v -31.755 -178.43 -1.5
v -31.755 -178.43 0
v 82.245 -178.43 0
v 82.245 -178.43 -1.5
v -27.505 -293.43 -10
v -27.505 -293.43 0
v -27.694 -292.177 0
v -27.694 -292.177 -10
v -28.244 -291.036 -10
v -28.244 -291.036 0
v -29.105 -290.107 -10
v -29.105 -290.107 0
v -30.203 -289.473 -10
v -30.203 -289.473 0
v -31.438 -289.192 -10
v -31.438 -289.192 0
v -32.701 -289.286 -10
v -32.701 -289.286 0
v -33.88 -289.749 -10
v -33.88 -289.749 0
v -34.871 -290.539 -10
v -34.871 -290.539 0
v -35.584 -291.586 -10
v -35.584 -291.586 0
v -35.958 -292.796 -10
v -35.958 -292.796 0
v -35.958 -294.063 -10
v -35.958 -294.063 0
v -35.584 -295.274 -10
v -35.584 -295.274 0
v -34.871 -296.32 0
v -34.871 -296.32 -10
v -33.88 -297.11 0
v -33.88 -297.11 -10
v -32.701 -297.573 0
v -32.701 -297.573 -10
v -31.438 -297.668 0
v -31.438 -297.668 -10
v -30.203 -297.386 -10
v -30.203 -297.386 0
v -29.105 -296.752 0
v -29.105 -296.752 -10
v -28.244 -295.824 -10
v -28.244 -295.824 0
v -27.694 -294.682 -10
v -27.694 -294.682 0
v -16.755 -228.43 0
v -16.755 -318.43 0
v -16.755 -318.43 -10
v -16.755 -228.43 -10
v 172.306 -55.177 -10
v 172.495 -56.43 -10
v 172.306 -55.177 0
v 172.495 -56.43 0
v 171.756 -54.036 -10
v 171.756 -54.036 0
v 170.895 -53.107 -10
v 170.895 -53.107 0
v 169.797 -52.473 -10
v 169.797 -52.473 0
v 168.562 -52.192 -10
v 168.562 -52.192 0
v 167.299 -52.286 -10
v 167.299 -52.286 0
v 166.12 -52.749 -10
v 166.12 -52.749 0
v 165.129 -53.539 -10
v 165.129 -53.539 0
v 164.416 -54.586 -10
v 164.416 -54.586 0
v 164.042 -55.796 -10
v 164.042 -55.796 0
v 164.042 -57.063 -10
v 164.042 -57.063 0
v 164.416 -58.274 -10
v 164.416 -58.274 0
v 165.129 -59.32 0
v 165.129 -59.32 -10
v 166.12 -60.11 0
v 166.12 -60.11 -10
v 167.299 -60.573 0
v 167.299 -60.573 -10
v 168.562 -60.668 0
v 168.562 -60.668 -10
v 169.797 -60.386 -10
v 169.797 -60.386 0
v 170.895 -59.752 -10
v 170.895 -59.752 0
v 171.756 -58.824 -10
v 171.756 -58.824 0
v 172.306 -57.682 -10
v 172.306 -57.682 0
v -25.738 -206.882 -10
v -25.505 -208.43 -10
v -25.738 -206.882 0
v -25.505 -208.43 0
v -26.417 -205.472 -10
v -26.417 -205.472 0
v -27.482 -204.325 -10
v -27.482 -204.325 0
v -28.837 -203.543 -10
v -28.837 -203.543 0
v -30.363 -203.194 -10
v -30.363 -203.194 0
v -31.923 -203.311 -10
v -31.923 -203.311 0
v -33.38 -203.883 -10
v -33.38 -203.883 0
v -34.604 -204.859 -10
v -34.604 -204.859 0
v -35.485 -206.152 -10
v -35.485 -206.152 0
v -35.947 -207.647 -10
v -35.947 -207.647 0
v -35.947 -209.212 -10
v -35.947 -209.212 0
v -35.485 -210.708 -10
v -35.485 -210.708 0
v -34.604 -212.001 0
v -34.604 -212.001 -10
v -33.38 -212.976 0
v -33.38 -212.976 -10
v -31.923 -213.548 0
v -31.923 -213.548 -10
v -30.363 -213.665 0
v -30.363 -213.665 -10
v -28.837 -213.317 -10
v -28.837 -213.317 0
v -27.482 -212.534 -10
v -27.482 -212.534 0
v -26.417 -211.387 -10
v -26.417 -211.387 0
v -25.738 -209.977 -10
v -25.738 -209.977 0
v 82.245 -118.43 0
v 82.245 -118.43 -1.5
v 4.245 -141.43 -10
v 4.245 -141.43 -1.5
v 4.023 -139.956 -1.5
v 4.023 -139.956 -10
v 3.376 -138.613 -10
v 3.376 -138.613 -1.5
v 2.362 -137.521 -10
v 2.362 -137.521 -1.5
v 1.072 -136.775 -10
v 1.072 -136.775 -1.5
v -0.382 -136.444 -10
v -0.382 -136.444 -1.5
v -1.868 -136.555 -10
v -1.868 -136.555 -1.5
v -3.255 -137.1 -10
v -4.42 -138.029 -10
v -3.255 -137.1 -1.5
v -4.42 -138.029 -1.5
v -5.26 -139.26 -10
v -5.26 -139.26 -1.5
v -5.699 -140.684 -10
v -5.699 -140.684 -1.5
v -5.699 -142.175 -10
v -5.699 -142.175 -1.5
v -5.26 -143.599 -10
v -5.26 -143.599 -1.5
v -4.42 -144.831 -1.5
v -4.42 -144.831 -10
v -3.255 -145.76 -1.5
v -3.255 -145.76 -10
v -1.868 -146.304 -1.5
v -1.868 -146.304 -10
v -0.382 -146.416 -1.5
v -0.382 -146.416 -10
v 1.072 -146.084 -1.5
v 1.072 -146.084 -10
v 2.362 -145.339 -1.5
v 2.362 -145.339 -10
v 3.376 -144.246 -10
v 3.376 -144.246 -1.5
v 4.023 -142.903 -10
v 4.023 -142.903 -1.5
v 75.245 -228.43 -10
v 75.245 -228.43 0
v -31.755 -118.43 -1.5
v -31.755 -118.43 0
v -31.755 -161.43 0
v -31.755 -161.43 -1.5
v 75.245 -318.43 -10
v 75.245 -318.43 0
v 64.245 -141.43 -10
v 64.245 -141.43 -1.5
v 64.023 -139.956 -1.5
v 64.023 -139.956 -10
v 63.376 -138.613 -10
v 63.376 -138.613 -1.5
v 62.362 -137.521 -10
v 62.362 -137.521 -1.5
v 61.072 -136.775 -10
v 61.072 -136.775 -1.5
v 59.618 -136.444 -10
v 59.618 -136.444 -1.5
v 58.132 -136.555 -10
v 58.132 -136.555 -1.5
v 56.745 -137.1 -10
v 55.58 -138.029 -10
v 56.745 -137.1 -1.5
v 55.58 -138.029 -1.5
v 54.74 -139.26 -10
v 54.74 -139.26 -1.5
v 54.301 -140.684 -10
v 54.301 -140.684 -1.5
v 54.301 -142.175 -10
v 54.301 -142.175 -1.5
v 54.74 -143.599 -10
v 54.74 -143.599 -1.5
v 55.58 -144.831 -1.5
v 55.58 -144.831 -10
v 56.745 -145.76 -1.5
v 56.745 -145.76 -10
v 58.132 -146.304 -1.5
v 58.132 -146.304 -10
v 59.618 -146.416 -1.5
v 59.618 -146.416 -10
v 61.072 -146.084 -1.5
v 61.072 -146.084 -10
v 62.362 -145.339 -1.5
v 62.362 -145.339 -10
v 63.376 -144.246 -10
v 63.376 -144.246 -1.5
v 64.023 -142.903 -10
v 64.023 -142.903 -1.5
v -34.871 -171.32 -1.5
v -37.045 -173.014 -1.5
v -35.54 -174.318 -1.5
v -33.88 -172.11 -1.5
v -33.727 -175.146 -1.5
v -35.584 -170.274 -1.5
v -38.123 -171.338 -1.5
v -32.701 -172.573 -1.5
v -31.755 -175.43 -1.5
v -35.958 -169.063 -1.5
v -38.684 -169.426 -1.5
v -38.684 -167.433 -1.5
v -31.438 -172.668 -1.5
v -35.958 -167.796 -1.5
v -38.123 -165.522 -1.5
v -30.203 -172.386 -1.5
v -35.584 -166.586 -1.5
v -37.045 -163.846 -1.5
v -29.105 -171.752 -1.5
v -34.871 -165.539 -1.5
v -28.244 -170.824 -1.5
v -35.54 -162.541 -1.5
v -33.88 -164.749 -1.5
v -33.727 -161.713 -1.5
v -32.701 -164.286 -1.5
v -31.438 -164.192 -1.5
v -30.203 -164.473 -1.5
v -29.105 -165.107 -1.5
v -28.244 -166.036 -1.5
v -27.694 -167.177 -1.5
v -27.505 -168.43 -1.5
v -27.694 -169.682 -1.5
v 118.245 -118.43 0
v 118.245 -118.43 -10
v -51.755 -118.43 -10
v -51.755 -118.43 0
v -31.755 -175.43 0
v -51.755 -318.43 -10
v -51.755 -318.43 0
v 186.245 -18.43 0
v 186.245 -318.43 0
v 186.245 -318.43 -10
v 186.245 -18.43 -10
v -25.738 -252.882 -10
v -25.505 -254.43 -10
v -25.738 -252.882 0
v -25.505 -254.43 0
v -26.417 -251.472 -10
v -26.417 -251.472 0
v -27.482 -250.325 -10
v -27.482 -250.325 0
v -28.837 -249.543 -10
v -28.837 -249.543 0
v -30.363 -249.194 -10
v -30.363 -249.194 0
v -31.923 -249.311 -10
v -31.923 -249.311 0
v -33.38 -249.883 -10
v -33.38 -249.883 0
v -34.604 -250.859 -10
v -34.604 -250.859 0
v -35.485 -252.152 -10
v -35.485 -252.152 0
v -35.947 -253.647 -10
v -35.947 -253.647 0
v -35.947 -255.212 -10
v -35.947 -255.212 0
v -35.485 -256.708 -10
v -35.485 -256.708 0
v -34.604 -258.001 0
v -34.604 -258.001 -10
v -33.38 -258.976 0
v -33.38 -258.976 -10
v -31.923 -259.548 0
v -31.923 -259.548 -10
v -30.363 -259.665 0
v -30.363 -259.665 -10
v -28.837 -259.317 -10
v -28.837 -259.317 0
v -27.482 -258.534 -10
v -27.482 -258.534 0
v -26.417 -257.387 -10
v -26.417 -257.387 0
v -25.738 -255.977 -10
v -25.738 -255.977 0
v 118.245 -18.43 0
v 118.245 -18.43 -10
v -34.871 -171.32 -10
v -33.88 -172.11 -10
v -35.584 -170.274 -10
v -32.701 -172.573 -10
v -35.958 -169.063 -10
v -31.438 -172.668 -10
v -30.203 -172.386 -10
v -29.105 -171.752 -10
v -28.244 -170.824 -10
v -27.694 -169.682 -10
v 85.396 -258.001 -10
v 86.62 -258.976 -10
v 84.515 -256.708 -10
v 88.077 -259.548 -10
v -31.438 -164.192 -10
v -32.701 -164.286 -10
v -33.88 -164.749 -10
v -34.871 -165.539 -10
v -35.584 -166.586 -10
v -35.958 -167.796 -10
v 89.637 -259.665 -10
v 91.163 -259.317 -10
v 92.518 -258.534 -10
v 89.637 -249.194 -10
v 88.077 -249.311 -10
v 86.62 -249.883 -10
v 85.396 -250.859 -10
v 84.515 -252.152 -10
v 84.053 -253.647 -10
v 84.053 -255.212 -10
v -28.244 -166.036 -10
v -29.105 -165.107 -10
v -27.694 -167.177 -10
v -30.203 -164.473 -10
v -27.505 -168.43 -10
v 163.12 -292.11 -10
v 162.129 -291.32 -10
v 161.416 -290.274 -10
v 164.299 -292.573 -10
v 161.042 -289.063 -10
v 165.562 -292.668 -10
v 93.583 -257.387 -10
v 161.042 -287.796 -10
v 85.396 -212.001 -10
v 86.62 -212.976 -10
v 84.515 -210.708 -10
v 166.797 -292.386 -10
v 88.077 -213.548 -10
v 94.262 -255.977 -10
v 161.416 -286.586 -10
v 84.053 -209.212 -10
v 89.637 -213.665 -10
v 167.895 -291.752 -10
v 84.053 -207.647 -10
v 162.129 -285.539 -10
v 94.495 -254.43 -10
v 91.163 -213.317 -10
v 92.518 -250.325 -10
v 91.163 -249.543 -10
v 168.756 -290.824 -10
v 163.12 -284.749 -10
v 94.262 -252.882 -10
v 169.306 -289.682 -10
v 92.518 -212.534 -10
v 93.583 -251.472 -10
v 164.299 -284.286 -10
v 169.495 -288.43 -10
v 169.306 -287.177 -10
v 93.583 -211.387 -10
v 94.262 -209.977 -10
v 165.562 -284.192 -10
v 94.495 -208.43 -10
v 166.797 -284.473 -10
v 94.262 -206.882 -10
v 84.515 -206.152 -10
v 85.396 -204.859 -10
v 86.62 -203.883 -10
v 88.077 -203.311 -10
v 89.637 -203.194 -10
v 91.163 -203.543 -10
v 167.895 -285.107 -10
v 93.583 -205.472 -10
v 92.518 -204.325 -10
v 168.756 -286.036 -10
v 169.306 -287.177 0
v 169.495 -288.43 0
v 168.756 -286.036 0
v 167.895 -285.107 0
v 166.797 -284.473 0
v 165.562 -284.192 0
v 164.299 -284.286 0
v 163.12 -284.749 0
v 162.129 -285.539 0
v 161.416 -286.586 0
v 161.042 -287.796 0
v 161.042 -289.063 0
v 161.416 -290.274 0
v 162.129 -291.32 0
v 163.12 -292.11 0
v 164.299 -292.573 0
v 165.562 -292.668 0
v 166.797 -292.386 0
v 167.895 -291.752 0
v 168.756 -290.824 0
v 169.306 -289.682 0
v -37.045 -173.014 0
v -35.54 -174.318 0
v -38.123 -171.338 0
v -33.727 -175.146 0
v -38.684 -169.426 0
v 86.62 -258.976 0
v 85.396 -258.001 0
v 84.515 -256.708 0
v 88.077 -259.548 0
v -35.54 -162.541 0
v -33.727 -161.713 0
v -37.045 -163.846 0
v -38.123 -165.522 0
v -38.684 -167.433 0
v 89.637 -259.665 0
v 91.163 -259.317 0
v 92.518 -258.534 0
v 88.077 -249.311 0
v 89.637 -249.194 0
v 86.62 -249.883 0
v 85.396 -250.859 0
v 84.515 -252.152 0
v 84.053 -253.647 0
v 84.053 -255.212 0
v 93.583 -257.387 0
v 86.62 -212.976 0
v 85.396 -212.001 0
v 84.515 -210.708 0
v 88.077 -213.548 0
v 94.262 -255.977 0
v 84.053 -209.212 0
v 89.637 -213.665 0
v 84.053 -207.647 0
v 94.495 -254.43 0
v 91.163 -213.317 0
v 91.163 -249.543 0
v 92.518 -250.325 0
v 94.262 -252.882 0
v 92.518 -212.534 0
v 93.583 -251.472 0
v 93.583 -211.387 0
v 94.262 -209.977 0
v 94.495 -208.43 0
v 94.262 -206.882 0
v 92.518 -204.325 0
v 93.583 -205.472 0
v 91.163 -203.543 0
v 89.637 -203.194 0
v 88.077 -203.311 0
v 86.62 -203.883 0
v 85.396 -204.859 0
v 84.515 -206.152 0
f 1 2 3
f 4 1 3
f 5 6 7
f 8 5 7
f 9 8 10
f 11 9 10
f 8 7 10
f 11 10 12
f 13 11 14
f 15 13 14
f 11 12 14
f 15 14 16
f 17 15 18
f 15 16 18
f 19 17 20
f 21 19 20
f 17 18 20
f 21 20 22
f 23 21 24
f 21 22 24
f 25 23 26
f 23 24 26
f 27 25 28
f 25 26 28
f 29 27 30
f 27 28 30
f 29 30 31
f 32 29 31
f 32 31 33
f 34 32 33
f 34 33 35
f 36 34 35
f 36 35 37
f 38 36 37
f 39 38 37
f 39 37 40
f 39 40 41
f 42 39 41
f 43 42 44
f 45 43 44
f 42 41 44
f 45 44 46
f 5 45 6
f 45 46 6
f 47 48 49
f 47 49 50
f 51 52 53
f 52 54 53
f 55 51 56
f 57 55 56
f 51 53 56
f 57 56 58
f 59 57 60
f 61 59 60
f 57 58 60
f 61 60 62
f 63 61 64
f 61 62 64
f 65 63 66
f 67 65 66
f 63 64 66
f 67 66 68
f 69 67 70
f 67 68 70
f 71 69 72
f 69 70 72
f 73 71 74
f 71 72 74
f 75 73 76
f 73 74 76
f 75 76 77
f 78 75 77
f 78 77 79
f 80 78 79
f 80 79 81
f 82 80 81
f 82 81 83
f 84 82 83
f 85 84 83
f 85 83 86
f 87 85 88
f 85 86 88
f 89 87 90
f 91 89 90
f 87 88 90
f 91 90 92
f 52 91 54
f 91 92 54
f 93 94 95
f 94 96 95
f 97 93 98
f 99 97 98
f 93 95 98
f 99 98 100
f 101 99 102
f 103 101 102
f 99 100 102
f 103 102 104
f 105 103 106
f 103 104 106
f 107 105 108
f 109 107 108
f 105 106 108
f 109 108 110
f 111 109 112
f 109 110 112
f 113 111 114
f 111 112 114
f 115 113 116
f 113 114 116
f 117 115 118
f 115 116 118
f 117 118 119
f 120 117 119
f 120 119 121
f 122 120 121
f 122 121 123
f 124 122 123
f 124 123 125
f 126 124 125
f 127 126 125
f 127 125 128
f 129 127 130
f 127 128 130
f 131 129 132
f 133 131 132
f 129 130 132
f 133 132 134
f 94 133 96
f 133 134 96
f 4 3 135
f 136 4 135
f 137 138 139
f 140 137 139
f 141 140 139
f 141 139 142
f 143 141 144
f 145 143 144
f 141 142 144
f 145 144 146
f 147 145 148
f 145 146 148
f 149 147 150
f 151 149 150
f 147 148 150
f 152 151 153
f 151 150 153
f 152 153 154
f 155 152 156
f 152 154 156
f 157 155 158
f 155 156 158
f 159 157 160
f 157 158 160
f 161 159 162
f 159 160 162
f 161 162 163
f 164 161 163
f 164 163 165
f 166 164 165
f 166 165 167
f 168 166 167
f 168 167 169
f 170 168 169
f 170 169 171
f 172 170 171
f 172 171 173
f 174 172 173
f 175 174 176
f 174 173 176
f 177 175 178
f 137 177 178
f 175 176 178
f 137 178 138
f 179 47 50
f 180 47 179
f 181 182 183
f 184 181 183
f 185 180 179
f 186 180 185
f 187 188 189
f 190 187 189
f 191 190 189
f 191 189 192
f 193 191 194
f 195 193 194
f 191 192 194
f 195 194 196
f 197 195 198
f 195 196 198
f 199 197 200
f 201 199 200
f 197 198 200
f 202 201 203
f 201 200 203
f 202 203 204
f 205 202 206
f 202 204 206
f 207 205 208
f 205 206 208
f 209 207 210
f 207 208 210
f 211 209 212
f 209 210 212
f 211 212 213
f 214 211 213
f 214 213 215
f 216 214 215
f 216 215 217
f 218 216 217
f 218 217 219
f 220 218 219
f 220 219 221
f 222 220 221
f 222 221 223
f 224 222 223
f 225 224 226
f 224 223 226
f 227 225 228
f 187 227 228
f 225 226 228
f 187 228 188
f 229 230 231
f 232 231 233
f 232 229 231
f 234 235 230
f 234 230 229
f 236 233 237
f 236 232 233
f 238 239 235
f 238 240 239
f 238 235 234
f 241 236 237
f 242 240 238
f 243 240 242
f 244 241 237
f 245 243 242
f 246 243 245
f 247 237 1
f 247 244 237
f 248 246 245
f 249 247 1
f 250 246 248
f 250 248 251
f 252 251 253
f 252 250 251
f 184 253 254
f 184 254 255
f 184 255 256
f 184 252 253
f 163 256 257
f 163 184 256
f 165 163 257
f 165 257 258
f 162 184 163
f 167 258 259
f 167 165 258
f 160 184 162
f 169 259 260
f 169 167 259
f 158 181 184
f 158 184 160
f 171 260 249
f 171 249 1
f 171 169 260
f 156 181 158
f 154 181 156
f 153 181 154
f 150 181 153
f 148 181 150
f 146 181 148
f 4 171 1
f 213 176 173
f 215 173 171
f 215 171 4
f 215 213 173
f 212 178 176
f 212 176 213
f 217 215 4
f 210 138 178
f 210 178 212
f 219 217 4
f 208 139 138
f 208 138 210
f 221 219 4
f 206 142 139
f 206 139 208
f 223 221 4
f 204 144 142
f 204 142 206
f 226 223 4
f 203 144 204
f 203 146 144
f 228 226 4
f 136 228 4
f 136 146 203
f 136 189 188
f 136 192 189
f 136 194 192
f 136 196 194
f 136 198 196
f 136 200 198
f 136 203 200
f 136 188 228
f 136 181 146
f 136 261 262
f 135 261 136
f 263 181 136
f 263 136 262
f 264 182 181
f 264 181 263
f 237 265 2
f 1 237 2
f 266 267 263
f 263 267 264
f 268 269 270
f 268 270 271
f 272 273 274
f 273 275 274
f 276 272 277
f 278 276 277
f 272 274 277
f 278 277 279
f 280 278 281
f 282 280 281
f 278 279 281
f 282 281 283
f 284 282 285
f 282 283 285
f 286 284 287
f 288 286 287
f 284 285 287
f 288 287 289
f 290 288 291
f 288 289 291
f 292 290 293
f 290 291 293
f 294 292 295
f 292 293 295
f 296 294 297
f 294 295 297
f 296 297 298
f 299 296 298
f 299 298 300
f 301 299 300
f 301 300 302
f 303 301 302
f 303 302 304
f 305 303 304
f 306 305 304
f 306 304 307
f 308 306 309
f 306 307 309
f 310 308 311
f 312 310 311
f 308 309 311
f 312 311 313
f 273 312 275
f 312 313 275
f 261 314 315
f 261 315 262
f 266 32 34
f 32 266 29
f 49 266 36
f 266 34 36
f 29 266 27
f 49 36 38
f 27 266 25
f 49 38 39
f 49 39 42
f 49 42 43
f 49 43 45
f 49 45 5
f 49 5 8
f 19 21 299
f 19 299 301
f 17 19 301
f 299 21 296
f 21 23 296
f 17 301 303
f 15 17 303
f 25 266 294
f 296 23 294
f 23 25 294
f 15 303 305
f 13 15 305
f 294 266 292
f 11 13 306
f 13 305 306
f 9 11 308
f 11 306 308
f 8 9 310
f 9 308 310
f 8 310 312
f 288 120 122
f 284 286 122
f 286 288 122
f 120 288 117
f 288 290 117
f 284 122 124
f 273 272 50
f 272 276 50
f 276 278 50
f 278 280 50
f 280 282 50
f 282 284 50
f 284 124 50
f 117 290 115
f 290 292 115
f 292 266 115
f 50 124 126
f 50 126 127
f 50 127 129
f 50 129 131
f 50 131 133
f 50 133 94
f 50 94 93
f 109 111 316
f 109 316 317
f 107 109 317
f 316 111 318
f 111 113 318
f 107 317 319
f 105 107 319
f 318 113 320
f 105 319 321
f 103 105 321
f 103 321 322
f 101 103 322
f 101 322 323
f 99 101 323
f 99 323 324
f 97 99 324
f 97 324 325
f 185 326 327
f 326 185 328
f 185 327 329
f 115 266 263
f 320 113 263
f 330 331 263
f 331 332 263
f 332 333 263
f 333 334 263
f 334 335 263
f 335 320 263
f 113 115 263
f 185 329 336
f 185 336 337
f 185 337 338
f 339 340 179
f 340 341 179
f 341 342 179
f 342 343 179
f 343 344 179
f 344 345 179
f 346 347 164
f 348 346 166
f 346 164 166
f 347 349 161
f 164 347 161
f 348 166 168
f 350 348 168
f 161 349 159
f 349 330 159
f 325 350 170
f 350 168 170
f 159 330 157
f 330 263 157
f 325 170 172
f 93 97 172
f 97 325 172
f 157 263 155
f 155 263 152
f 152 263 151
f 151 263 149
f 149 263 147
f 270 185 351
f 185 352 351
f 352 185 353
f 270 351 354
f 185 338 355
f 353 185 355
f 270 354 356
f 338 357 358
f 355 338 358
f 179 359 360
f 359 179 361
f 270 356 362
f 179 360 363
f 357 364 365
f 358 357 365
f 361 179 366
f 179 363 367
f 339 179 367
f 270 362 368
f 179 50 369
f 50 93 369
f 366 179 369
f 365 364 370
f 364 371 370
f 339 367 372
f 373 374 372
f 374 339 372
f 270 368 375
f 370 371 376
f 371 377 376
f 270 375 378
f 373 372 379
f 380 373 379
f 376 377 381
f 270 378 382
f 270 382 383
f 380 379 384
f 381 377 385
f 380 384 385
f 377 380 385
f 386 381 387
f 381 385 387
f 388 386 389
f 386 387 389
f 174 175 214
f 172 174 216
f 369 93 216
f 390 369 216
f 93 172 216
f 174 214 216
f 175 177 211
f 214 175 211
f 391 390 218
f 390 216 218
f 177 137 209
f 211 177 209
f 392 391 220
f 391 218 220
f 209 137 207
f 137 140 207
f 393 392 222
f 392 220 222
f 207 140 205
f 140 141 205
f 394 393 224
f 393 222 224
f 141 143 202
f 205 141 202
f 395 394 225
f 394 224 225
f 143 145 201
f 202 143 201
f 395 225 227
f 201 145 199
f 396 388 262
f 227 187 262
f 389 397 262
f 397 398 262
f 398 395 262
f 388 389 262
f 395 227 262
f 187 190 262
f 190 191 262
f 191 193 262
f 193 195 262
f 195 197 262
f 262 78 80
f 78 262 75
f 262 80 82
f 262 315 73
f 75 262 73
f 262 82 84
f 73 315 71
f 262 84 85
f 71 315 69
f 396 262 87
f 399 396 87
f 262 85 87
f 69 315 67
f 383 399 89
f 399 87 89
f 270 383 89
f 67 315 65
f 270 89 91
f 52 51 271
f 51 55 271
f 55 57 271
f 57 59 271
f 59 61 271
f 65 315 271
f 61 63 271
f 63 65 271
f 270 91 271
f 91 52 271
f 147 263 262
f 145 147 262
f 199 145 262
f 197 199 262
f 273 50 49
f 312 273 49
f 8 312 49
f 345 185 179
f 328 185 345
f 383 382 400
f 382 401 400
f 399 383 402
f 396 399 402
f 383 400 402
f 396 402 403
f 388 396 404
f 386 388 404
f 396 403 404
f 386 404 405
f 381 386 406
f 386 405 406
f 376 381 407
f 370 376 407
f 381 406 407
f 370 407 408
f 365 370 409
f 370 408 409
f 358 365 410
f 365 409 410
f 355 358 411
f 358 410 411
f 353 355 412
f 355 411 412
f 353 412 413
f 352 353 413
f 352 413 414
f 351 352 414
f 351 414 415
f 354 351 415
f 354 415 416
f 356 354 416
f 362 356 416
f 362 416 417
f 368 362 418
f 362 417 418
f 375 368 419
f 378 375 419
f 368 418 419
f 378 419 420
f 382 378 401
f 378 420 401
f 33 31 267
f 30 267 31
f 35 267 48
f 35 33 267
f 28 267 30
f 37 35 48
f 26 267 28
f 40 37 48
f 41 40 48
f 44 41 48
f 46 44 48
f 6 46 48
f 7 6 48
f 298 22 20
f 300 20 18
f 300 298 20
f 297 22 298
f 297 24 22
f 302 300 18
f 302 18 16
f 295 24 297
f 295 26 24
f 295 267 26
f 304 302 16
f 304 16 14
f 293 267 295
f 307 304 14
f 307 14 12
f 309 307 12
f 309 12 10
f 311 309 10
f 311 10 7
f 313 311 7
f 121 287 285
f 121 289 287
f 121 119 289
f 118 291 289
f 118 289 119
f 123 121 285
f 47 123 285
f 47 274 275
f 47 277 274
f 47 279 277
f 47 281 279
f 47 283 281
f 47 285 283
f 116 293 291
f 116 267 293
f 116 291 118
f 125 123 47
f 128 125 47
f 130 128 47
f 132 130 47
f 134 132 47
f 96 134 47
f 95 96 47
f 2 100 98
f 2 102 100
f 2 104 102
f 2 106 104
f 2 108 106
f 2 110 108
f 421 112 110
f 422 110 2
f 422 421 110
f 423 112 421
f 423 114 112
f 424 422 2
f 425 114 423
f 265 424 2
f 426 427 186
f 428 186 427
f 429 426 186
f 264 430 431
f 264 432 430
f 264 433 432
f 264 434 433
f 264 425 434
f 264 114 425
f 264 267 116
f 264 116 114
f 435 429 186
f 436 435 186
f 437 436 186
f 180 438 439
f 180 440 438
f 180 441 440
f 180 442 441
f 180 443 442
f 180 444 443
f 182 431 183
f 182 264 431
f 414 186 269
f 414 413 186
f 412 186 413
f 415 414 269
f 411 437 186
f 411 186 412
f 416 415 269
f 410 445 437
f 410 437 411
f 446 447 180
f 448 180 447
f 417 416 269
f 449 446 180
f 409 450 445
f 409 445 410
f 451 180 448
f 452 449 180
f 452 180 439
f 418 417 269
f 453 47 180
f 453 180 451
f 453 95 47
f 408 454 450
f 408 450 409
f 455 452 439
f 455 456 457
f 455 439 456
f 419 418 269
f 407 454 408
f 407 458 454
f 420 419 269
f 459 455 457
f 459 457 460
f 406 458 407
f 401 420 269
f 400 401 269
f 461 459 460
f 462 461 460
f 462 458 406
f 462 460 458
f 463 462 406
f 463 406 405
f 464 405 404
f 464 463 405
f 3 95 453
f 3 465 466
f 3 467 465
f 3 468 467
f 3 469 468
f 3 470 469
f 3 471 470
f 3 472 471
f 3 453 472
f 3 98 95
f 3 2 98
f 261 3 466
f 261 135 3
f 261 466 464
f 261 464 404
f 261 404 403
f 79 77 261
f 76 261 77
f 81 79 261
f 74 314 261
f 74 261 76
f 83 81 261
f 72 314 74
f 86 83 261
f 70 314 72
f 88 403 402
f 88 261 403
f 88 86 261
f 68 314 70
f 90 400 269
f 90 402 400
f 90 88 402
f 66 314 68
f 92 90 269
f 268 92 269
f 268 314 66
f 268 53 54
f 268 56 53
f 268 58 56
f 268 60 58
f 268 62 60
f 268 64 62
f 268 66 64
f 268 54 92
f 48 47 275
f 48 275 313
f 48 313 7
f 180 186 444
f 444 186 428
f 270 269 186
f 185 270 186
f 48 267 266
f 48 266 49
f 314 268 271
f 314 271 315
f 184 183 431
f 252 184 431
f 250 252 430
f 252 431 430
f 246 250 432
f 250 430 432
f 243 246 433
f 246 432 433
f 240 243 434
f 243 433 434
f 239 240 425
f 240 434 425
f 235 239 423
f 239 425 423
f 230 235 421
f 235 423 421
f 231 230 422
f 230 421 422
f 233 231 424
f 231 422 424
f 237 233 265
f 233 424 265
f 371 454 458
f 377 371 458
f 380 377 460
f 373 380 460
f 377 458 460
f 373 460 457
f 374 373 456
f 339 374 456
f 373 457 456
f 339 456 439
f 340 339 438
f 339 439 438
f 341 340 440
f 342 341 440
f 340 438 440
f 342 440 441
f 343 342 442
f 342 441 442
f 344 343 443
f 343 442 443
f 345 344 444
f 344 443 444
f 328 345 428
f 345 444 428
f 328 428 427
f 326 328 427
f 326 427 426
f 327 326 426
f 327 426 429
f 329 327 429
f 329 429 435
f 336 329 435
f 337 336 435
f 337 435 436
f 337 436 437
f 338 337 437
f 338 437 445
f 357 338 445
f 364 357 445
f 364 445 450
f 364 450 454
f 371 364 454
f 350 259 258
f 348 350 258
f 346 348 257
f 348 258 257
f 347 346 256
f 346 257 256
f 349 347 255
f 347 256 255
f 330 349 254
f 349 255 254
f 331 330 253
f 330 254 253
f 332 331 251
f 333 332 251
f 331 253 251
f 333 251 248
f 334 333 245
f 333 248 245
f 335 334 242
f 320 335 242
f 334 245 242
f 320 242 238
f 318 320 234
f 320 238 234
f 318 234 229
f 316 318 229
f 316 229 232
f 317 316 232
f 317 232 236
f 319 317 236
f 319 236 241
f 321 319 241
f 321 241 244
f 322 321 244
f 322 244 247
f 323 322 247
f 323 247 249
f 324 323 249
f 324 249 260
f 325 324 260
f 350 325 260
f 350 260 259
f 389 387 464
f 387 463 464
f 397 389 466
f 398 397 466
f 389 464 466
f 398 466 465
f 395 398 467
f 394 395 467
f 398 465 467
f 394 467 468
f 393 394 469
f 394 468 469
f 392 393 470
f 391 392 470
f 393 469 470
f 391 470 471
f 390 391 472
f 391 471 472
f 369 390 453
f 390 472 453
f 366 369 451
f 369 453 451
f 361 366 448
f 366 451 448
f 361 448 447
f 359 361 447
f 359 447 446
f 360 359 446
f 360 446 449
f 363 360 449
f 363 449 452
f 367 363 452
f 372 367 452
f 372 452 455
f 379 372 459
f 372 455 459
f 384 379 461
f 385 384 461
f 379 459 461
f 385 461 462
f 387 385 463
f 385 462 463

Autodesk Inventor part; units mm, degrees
ref_plane "YZ Plane" through (0, 0, 0) normal (1, 0, 0) x (0, 1, 0)
ref_plane "XZ Plane" through (0, 0, 0) normal (0, 1, 0) x (-1, 0, 0)
ref_plane "XY Plane" through (0, 0, 0) normal (0, 0, 1) x (1, 0, 0)
ref_plane "Work Plane1" through (678.6266, 4, 0) normal (0, 0, 1) x (1, 0, 0)
sketch "Sketch1" plane through (678.6266, 4, 0) normal (0, 0, 1) x (1, 0, 0)
  circle A0 centre (-710.3818, -172.4297) radius 4.25
  line L0 (-690.3818, -322.4297) -> (-513.3818, -322.4297) construction
  circle A1 centre (-679.3818, -145.4297) radius 5
  circle A2 centre (-619.3818, -145.4297) radius 5
  line L1 (-730.3818, -322.4297) -> (-695.3818, -322.4297)
  line L2 (-695.3818, -322.4297) -> (-695.3818, -232.4297)
  line L3 (-695.3818, -232.4297) -> (-603.3818, -232.4297)
  line L4 (-603.3818, -232.4297) -> (-603.3818, -322.4297)
  circle A3 centre (-710.3818, -172.4297) radius 4.25
  circle A4 centre (-513.3818, -292.4297) radius 4.25
  circle A5 centre (-510.3818, -60.4297) radius 4.25
  line L5 (-488.3818, -194.7007) -> (-492.3818, -194.7007)
  line L6 (-492.3818, -194.7007) -> (-492.3818, -322.4297)
  line L7 (-492.3818, -322.4297) -> (-492.3818, -22.4297)
  line L8 (-492.3818, -322.4297) -> (-603.3818, -322.4297)
  line L9 (-555.3818, -22.4297) -> (-492.3818, -22.4297)
  line L10 (-492.3818, -22.4297) -> (-560.3818, -22.4297)
  line L11 (-560.3818, -22.4297) -> (-560.3818, -120.4297)
  circle A6 centre (-710.3818, -297.4297) radius 4.25
  line L12 (-560.3818, -22.4297) -> (-560.3818, -122.4297)
  line L13 (-560.3818, -122.4297) -> (-730.3818, -122.4297)
  line L14 (-730.3818, -322.4297) -> (-730.3818, -122.4297)
  line L15 (-710.3818, -122.4297) -> (-710.3818, -182.4297)
  line L16 (-710.3818, -182.4297) -> (-596.3818, -182.4297)
  line L17 (-596.3818, -182.4297) -> (-596.3818, -122.4297)
  circle A7 centre (-710.3818, -172.4297) radius 7
  circle A8 centre (-709.3818, -258.4297) radius 5.25
  circle A9 centre (-709.3818, -212.4297) radius 5.25
  line L18 (-709.3818, -258.4297) -> (-589.3818, -258.4297) construction
  circle A10 centre (-589.3818, -258.4297) radius 5.25
  circle A11 centre (-589.3818, -212.4297) radius 5.25
  point P0 (-678.6266, -4)
  dimension "d52" = 8.5
  dimension "d57" = 10
  dimension "d59" = 10
  dimension "d61" = 35
  dimension "d62" = 92
  dimension "d70" = 8.5
  dimension "d71" = 8.5
  dimension "d72" = 4
  dimension "d73" = 68
  dimension "d75" = 8.5
  dimension "d76" = 100
  dimension "d77" = 200
  dimension "d78" = 170
  dimension "d80" = 60
  dimension "d81" = 114
  dimension "d88" = 14
  dimension "d95" = 10.5
  dimension "d96" = 10.5
  dimension "d100" = 10.5
  dimension "d101" = 10.5
extrude "Extrusion5" add sketch "Sketch1" against normal blind 10 contours A0 L15 | A0 L15 A7 | L15 A0 | A0 L15 A7 | A7 L15 L16 L17 L13 L12 L11 L10 L9 L7 L6 L8 L4 L3 L2 L1 L14 | L15 L13 L17 L16 A7 | A8 | A9 | A10 | A11
extrude "Extrusion7" cut sketch "Sketch1" against normal blind 1.5 contours A0 L15 | A0 L15 A7 | L15 L13 L17 L16 A7 picked at (-708.9651, -172.4297) picked at (-709.5473, -178.419)
extrude "Extrusion6" cut sketch "Sketch1" against normal blind 10 contours A0 L15 | L15 A0
extrude "Extrusion8" cut sketch "Sketch1" against normal blind 1.5 contours A0 L15 A7 | A0 L15 A7
extrude "Extrusion9" cut sketch "Sketch1" against normal blind 10.5 contours A8 | A9 | A10 | A11
